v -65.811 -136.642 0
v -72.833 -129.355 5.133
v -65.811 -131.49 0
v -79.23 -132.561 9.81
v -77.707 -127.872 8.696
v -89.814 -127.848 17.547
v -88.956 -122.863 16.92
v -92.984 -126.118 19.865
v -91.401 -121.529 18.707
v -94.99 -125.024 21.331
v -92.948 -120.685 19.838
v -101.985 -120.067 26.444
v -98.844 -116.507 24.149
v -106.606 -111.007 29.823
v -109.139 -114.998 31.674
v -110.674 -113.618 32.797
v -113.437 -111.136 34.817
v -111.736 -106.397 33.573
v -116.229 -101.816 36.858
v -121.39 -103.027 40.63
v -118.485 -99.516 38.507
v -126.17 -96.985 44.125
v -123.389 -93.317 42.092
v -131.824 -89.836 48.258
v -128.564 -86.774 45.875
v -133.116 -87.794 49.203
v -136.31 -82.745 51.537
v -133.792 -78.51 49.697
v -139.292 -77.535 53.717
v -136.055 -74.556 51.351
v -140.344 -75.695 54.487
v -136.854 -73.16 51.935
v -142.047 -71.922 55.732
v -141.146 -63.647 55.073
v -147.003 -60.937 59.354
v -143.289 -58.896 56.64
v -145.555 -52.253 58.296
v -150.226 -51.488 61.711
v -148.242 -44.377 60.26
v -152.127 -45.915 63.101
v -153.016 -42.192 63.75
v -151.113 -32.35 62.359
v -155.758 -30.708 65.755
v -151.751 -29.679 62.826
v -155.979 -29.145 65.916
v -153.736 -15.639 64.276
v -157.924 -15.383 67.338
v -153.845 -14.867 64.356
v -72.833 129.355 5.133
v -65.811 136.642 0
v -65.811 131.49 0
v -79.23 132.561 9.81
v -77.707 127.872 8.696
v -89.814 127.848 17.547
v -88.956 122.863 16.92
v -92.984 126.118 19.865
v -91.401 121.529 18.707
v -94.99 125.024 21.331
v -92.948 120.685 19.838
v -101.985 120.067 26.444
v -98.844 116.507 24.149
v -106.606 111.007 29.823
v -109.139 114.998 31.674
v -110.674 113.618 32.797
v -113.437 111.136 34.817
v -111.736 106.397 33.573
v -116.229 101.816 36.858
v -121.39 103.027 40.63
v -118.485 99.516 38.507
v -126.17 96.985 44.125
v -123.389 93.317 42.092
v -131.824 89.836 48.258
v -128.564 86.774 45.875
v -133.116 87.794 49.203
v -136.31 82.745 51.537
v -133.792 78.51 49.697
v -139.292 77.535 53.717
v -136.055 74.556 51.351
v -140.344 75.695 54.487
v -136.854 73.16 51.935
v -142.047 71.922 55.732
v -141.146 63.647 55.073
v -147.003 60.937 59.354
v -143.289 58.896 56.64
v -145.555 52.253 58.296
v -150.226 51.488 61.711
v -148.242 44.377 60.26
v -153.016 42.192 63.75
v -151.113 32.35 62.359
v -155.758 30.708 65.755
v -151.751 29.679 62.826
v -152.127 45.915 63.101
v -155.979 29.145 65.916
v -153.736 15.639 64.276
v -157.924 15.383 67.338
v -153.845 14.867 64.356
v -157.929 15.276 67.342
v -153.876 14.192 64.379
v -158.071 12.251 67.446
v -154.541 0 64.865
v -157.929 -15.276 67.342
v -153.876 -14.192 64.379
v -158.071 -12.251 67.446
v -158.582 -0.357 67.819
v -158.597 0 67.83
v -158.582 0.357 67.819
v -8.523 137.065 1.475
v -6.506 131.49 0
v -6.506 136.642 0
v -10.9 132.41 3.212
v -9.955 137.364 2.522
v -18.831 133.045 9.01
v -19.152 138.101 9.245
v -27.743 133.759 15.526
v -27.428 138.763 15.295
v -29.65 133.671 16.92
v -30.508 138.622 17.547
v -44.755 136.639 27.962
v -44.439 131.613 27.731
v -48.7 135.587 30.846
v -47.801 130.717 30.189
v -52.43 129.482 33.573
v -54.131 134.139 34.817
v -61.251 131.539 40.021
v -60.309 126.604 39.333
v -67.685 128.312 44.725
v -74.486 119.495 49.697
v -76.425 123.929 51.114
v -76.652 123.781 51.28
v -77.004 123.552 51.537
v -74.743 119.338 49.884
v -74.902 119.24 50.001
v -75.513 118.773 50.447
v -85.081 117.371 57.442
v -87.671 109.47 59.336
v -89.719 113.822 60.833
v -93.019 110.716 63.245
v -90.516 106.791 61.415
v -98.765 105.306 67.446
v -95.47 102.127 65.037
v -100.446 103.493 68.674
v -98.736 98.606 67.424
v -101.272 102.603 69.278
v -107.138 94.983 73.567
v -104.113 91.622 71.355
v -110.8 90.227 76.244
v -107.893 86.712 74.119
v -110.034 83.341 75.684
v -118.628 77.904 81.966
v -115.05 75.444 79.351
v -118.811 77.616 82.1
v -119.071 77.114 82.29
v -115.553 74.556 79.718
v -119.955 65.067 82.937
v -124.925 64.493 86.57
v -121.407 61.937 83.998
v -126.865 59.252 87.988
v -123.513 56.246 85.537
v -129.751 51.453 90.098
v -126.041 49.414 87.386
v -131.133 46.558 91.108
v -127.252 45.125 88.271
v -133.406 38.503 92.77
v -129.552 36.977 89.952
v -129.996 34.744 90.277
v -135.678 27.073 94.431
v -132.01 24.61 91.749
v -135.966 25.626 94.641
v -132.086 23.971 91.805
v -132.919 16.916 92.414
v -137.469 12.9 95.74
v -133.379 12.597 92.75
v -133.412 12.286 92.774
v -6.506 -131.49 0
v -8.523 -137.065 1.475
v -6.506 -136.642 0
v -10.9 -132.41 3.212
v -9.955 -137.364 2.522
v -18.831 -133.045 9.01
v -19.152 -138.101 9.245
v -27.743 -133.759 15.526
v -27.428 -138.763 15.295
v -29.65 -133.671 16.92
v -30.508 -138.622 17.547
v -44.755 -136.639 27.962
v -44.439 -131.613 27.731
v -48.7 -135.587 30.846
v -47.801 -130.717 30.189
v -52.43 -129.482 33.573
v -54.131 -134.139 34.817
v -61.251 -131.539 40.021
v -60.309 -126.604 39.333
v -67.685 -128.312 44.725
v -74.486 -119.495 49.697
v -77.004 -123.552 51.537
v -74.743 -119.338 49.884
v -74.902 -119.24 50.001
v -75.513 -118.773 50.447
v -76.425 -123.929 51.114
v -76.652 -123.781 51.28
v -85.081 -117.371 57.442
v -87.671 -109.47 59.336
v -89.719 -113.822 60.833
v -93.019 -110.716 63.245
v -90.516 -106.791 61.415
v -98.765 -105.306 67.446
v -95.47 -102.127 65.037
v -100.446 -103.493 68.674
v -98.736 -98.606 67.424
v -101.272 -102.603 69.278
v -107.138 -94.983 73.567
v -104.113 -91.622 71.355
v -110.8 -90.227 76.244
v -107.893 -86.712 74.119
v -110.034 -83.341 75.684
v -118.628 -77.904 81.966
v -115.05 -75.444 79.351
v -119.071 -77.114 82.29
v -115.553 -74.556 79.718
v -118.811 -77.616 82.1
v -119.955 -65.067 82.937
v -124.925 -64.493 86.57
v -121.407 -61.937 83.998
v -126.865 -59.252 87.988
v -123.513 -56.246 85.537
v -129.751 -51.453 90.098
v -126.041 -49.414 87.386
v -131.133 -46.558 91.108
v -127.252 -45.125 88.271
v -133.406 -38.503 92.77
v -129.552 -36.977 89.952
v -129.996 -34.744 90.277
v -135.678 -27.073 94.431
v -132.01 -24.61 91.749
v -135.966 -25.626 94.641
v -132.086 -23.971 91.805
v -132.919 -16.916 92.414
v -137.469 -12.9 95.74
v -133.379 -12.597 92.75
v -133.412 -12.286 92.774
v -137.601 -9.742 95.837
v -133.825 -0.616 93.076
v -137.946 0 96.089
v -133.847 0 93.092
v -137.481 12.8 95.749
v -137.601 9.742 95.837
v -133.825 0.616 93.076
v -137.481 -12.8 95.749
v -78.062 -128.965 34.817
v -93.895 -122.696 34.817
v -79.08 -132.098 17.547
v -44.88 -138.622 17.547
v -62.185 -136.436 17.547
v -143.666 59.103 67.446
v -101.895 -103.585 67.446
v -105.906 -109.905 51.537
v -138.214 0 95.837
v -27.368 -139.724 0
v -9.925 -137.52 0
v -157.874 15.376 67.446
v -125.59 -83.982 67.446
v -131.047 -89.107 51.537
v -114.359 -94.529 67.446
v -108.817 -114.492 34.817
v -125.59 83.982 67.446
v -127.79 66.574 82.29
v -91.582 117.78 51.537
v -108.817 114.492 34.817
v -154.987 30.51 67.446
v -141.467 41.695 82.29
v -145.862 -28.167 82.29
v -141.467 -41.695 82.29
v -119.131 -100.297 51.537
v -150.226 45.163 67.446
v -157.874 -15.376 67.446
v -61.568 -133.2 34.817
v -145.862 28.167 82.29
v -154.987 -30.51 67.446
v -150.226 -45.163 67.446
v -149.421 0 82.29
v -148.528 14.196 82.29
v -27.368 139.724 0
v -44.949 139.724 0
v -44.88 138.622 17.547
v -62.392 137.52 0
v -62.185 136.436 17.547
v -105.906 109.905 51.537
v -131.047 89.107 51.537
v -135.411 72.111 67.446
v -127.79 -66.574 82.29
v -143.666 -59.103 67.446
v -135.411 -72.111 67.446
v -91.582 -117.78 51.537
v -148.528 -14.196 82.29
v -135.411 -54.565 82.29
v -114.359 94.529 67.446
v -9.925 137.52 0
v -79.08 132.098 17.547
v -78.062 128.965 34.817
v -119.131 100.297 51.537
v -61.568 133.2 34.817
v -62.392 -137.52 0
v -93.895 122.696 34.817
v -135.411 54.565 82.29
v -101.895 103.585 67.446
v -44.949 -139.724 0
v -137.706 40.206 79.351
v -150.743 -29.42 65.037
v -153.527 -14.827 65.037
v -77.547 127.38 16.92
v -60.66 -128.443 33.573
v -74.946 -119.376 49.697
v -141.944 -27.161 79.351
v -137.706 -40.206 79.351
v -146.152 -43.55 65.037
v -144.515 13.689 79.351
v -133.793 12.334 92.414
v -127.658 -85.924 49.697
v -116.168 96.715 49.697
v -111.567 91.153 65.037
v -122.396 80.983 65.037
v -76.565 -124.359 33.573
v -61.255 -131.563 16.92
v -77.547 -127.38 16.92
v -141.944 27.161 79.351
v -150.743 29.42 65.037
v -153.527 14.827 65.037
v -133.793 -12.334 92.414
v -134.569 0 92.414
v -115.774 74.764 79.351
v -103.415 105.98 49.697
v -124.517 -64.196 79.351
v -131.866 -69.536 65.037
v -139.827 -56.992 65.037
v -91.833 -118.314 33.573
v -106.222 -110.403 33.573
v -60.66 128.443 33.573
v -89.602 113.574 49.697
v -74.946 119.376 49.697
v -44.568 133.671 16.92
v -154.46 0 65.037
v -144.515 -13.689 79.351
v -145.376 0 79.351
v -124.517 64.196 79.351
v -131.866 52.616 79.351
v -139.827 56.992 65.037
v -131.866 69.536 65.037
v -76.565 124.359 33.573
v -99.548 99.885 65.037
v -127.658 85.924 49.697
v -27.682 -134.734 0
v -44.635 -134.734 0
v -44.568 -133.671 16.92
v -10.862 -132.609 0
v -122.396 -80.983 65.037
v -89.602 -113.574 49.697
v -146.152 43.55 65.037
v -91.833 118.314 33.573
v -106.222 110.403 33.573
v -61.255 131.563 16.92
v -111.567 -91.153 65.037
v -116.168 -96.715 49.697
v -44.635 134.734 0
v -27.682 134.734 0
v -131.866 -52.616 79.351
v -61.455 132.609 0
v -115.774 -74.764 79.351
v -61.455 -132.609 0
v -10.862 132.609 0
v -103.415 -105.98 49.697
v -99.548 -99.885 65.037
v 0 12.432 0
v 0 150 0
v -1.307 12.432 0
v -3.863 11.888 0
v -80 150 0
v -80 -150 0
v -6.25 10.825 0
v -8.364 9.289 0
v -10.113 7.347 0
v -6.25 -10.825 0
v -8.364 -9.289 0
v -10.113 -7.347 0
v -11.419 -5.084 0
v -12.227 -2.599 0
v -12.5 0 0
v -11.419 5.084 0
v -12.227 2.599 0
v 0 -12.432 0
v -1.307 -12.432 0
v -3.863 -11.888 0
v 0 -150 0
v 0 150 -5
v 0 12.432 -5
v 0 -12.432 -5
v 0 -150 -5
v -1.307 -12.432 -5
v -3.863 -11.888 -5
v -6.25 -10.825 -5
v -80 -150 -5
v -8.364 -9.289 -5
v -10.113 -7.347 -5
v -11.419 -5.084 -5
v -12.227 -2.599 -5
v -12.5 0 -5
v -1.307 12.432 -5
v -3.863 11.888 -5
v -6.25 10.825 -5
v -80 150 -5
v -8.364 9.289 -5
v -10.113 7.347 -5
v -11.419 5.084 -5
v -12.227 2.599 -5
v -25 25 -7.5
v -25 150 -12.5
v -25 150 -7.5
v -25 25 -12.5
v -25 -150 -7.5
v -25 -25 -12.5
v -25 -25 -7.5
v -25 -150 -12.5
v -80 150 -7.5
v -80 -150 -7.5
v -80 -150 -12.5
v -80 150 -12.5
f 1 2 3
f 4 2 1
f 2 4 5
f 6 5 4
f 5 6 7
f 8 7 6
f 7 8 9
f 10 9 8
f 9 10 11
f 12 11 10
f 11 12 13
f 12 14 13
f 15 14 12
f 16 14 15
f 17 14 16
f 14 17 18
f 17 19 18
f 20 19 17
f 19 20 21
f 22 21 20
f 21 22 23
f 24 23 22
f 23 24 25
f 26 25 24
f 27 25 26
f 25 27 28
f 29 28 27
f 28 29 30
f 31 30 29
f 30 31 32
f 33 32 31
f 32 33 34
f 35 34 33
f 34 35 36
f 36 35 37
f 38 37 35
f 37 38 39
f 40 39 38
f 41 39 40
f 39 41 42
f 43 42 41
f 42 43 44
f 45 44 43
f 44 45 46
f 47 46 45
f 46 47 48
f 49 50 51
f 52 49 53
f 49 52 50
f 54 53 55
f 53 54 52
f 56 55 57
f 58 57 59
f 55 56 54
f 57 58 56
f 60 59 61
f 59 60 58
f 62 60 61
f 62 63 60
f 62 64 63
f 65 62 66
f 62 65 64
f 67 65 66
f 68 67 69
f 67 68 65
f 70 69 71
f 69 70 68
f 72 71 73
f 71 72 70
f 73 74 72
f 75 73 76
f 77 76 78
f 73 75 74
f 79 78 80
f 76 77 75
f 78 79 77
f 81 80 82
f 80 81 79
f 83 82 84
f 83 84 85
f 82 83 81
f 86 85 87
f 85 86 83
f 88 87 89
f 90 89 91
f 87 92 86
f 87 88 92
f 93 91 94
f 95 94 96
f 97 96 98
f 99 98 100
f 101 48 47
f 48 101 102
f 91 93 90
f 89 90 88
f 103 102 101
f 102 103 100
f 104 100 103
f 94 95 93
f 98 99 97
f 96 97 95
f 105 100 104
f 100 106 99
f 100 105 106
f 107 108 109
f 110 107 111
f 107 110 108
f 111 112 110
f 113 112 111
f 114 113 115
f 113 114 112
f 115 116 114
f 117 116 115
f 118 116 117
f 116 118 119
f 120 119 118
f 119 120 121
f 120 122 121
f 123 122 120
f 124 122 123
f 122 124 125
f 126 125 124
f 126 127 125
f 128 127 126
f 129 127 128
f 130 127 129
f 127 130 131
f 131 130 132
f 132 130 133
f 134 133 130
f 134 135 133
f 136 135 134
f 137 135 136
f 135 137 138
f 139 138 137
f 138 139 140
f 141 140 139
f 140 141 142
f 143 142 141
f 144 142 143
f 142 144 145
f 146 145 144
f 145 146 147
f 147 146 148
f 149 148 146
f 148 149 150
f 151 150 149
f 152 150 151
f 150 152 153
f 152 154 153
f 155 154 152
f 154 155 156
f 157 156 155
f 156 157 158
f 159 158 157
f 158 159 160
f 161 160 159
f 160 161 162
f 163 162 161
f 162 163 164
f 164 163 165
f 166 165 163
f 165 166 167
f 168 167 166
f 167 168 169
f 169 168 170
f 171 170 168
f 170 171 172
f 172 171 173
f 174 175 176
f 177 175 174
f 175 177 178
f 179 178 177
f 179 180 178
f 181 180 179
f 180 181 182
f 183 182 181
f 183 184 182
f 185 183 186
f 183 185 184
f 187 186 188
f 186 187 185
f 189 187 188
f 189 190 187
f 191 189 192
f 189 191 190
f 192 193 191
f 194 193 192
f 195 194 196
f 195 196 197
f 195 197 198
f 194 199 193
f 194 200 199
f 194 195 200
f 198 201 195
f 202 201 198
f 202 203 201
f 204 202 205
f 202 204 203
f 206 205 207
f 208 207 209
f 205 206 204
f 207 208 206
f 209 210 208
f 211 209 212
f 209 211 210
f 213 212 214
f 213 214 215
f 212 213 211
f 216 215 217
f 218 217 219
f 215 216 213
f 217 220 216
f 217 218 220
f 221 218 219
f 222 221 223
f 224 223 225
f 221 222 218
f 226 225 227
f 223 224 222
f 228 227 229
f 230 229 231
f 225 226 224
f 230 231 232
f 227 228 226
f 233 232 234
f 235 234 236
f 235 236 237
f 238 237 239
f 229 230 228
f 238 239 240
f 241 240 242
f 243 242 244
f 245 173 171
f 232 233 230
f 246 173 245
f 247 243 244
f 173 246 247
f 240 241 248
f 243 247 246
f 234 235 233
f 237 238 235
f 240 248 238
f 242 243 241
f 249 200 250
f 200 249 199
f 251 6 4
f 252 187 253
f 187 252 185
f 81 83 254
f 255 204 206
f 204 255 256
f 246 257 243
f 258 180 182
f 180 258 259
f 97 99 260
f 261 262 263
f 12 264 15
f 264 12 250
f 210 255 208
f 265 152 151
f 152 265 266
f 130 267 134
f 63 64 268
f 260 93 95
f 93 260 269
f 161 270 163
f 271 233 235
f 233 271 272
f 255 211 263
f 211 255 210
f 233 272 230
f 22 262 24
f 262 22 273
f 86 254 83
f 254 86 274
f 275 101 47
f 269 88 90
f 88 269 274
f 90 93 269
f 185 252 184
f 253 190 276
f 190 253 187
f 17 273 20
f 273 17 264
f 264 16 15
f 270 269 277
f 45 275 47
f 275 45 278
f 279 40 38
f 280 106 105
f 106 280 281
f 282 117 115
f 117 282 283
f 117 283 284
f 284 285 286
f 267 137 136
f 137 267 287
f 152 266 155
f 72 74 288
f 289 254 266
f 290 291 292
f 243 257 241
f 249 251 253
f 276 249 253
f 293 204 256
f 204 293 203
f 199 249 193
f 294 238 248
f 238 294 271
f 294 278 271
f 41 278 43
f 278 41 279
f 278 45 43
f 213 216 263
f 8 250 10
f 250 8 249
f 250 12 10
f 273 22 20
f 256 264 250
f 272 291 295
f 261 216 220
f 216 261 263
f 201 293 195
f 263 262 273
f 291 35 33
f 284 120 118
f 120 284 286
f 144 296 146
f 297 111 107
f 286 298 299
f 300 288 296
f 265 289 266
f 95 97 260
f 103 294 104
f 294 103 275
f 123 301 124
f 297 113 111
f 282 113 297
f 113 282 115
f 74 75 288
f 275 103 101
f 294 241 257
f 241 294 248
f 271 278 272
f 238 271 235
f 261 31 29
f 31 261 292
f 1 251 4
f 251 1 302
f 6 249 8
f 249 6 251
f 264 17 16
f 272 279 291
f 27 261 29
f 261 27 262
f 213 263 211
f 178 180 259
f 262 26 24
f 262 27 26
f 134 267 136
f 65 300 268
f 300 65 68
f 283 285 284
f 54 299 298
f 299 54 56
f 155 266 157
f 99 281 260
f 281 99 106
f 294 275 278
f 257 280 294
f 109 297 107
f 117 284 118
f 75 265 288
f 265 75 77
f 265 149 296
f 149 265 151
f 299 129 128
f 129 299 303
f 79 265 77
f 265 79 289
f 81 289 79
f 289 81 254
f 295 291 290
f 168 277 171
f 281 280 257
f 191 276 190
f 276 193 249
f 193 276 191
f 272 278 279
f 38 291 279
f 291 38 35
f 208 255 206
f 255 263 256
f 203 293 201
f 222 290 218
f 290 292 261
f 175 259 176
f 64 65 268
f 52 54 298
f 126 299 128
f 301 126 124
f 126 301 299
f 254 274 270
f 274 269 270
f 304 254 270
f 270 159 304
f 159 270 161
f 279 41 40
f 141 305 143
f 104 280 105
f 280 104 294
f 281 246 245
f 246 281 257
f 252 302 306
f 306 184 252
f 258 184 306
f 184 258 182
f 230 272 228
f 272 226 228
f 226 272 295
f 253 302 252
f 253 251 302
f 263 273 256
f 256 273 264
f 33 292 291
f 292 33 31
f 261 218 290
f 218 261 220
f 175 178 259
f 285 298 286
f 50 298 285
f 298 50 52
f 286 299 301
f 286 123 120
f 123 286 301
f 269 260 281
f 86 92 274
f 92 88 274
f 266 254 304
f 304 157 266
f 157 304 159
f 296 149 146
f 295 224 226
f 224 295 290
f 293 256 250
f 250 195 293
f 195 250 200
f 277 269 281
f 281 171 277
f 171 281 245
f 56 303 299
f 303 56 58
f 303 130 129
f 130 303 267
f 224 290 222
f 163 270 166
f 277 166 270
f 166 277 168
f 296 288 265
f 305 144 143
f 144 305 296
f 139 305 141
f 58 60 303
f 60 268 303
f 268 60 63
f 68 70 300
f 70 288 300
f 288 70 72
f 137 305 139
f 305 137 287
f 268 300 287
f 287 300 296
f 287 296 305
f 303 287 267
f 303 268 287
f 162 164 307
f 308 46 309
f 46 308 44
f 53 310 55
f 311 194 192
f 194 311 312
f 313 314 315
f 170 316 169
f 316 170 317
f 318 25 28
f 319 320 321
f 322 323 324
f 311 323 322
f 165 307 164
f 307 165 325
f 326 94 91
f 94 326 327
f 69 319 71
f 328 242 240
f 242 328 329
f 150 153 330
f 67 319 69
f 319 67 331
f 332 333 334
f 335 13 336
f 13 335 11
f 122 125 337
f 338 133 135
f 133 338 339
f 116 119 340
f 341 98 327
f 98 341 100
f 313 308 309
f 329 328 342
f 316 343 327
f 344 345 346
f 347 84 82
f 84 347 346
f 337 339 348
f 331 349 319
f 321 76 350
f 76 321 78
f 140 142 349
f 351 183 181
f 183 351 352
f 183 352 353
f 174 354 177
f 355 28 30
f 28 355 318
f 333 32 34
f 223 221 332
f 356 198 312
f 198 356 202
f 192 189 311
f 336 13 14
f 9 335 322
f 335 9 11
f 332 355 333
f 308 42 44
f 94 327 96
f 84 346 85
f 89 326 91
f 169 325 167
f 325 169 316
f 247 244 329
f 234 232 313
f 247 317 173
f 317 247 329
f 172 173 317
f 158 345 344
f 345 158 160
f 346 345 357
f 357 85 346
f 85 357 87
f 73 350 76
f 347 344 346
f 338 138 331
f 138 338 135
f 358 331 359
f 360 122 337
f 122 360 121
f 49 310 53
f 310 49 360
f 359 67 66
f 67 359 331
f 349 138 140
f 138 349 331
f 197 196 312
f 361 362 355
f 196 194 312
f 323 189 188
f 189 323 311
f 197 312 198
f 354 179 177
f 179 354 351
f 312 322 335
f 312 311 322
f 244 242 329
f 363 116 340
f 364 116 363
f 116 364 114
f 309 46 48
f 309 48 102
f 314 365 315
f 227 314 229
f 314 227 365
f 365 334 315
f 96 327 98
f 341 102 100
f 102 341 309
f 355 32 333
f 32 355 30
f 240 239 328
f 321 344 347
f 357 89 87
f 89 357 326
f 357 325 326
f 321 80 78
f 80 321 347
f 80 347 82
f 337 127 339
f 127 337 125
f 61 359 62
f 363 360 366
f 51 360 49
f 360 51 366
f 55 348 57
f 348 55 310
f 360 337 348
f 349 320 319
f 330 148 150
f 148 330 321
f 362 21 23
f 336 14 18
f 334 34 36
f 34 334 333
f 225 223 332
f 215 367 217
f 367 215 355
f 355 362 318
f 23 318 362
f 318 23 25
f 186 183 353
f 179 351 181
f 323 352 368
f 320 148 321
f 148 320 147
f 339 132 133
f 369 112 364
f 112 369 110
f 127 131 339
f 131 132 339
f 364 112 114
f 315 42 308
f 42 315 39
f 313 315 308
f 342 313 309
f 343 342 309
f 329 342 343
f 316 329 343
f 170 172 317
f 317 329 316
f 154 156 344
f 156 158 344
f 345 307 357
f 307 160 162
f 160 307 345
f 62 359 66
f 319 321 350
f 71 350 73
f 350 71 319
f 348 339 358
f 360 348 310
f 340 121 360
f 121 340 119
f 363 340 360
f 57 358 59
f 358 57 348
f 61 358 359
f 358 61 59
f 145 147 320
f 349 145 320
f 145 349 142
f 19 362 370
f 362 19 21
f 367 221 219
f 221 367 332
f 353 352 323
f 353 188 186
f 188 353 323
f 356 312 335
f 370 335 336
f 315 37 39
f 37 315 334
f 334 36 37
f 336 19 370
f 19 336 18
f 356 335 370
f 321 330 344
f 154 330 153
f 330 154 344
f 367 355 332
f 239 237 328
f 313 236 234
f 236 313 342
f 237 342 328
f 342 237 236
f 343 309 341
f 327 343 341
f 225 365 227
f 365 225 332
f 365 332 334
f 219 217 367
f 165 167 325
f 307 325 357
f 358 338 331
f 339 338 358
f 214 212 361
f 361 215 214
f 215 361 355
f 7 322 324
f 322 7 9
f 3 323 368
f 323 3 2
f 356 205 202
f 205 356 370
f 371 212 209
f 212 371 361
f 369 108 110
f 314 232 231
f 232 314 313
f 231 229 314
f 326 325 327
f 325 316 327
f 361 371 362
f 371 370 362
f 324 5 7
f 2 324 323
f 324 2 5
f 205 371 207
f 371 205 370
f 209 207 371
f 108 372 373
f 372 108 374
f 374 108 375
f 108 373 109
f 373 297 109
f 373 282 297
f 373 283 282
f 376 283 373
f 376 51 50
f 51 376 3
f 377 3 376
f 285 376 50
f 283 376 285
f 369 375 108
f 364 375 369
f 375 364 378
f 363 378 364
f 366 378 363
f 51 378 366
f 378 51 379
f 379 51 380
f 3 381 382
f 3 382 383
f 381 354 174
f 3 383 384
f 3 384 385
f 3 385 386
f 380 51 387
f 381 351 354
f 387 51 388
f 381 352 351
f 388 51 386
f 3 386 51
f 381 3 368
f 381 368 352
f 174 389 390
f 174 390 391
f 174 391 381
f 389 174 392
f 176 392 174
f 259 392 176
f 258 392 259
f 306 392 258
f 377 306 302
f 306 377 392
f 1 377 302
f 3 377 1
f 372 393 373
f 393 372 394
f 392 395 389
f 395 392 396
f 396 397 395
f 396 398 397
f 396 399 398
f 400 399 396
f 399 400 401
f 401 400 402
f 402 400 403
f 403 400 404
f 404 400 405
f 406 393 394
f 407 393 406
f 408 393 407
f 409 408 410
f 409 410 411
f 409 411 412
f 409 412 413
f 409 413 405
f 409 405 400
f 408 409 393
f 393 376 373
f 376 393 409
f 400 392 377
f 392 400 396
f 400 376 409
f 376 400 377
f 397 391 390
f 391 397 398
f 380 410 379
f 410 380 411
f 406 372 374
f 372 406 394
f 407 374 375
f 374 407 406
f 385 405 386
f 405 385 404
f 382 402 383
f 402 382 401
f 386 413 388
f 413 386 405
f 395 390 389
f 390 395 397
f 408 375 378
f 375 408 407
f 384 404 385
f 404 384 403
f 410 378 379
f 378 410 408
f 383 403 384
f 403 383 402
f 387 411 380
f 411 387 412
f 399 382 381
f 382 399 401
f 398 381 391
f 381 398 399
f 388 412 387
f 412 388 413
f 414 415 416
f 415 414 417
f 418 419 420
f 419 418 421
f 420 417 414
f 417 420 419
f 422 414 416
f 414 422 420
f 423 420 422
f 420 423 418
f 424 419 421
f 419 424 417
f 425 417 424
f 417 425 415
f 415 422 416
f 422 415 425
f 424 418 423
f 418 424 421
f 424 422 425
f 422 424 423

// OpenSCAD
include <MCAD/units.scad>

//
// The following values where calculated by the sunshader script (from the clouds project).
// for date: 5/8/14
//sun_angle = -36.44;
//sun_offset =  0.36696701;
// for date: 12/8/14
//sun_angle = -35.3039;
//sun_offset =  0.316264308692;
// for date: 29/9/14
//sun_angle = -32.7591492134;
//sun_offset = 0.0530506267263;
// for date: 15/4/15
//sun_angle = -34.2392365306;
//sun_offset = 0.209588226863;
// for date: 24/5/15
//sun_angle = -39.5764032041;
//sun_offset = 0.473792640857;
// for date: 4/6/15
//sun_angle = -41.0892252744;
//sun_offset = 0.52118130747;
// for Leipzig, 18/10/15
sun_angle = -53.8315722229;
sun_offset = -0.258274603021;

//
// Model sizes
// -----------
// Radius of the sun shade
sb_radius = 140;
// Width of the sun shade (should match the lens size++)
// sb_width = 30; // Used for the leopard lens
camera_radius = 12.5; // OpteamX camera
sb_width = 35; // Used for the lens bought from OpteamX
// Thicknes of the sun shade arc (5 seems ok).
sb_thickness = 5;
// Resolution. Make it small while debugging. Larger (100) when creating
// final model.
sphere_res = 50;
// Inclination and offset of the sunshader
sb_angle = sun_angle;
sb_offset = sun_offset * sb_radius;

//
// Base length
//
base_height = 5;
base_length = sb_radius*2+20;
base_width = 90;
base_max_extent = 80;

camera_hole_size = 50;

//
// Create the sun shader
//
translate([sb_offset, 0, 0])
difference() {
    //
    // The main form without holes
    //
    sphere(r=sb_radius, $fn=sphere_res);
    
    //
    // Main hole
    //
    sphere(r=sb_radius-sb_thickness, $fn=sphere_res);
    
    //
    // Remove bottom half of sphere
    //
    translate([0, 0, -sb_radius/2])
    cube([sb_radius*2, sb_radius*2, sb_radius], center=true);
    
    //
    // cut at an angle of the sun shader
    //
    rotate([0, sb_angle, 0])
    {
        translate([-sb_radius-sb_width/2, 0, 0])
        cube([sb_radius*2, sb_radius*2, sb_radius*3], center=true);
        translate([sb_radius+sb_width/2, 0, 0])
        cube([sb_radius*2, sb_radius*2, sb_radius*3], center=true);
    }
}

//
// Base1:
//
translate([0, 0, -base_height/2])
union() {
    difference() {
        translate([-base_width/2, 0, 0])
        cube([base_width, base_length, base_height], center=true);
        
        //
        // Limit the extent of the base
        //
        translate([-base_width/2 - base_max_extent, 0, 0])
        cube([base_width, base_length, base_height], center=true);
        
        cylinder(h=base_height, r=camera_radius, center=true);
    }
};

//
// Base2:
//
translate([0, 0, -2*base_height])
difference() {
    difference() {
        translate([-base_width/2 - camera_hole_size/2, 0, 0])
        cube([base_width, base_length, base_height], center=true);
        
        //
        // Limit the extent of the base
        //
        translate([-base_width/2 - base_max_extent, 0, 0])
        cube([base_width, base_length, base_height], center=true);
    }
    
    //
    // Hole of camera
    //
    cube(size=[camera_hole_size, camera_hole_size, base_height], center=true);
};
